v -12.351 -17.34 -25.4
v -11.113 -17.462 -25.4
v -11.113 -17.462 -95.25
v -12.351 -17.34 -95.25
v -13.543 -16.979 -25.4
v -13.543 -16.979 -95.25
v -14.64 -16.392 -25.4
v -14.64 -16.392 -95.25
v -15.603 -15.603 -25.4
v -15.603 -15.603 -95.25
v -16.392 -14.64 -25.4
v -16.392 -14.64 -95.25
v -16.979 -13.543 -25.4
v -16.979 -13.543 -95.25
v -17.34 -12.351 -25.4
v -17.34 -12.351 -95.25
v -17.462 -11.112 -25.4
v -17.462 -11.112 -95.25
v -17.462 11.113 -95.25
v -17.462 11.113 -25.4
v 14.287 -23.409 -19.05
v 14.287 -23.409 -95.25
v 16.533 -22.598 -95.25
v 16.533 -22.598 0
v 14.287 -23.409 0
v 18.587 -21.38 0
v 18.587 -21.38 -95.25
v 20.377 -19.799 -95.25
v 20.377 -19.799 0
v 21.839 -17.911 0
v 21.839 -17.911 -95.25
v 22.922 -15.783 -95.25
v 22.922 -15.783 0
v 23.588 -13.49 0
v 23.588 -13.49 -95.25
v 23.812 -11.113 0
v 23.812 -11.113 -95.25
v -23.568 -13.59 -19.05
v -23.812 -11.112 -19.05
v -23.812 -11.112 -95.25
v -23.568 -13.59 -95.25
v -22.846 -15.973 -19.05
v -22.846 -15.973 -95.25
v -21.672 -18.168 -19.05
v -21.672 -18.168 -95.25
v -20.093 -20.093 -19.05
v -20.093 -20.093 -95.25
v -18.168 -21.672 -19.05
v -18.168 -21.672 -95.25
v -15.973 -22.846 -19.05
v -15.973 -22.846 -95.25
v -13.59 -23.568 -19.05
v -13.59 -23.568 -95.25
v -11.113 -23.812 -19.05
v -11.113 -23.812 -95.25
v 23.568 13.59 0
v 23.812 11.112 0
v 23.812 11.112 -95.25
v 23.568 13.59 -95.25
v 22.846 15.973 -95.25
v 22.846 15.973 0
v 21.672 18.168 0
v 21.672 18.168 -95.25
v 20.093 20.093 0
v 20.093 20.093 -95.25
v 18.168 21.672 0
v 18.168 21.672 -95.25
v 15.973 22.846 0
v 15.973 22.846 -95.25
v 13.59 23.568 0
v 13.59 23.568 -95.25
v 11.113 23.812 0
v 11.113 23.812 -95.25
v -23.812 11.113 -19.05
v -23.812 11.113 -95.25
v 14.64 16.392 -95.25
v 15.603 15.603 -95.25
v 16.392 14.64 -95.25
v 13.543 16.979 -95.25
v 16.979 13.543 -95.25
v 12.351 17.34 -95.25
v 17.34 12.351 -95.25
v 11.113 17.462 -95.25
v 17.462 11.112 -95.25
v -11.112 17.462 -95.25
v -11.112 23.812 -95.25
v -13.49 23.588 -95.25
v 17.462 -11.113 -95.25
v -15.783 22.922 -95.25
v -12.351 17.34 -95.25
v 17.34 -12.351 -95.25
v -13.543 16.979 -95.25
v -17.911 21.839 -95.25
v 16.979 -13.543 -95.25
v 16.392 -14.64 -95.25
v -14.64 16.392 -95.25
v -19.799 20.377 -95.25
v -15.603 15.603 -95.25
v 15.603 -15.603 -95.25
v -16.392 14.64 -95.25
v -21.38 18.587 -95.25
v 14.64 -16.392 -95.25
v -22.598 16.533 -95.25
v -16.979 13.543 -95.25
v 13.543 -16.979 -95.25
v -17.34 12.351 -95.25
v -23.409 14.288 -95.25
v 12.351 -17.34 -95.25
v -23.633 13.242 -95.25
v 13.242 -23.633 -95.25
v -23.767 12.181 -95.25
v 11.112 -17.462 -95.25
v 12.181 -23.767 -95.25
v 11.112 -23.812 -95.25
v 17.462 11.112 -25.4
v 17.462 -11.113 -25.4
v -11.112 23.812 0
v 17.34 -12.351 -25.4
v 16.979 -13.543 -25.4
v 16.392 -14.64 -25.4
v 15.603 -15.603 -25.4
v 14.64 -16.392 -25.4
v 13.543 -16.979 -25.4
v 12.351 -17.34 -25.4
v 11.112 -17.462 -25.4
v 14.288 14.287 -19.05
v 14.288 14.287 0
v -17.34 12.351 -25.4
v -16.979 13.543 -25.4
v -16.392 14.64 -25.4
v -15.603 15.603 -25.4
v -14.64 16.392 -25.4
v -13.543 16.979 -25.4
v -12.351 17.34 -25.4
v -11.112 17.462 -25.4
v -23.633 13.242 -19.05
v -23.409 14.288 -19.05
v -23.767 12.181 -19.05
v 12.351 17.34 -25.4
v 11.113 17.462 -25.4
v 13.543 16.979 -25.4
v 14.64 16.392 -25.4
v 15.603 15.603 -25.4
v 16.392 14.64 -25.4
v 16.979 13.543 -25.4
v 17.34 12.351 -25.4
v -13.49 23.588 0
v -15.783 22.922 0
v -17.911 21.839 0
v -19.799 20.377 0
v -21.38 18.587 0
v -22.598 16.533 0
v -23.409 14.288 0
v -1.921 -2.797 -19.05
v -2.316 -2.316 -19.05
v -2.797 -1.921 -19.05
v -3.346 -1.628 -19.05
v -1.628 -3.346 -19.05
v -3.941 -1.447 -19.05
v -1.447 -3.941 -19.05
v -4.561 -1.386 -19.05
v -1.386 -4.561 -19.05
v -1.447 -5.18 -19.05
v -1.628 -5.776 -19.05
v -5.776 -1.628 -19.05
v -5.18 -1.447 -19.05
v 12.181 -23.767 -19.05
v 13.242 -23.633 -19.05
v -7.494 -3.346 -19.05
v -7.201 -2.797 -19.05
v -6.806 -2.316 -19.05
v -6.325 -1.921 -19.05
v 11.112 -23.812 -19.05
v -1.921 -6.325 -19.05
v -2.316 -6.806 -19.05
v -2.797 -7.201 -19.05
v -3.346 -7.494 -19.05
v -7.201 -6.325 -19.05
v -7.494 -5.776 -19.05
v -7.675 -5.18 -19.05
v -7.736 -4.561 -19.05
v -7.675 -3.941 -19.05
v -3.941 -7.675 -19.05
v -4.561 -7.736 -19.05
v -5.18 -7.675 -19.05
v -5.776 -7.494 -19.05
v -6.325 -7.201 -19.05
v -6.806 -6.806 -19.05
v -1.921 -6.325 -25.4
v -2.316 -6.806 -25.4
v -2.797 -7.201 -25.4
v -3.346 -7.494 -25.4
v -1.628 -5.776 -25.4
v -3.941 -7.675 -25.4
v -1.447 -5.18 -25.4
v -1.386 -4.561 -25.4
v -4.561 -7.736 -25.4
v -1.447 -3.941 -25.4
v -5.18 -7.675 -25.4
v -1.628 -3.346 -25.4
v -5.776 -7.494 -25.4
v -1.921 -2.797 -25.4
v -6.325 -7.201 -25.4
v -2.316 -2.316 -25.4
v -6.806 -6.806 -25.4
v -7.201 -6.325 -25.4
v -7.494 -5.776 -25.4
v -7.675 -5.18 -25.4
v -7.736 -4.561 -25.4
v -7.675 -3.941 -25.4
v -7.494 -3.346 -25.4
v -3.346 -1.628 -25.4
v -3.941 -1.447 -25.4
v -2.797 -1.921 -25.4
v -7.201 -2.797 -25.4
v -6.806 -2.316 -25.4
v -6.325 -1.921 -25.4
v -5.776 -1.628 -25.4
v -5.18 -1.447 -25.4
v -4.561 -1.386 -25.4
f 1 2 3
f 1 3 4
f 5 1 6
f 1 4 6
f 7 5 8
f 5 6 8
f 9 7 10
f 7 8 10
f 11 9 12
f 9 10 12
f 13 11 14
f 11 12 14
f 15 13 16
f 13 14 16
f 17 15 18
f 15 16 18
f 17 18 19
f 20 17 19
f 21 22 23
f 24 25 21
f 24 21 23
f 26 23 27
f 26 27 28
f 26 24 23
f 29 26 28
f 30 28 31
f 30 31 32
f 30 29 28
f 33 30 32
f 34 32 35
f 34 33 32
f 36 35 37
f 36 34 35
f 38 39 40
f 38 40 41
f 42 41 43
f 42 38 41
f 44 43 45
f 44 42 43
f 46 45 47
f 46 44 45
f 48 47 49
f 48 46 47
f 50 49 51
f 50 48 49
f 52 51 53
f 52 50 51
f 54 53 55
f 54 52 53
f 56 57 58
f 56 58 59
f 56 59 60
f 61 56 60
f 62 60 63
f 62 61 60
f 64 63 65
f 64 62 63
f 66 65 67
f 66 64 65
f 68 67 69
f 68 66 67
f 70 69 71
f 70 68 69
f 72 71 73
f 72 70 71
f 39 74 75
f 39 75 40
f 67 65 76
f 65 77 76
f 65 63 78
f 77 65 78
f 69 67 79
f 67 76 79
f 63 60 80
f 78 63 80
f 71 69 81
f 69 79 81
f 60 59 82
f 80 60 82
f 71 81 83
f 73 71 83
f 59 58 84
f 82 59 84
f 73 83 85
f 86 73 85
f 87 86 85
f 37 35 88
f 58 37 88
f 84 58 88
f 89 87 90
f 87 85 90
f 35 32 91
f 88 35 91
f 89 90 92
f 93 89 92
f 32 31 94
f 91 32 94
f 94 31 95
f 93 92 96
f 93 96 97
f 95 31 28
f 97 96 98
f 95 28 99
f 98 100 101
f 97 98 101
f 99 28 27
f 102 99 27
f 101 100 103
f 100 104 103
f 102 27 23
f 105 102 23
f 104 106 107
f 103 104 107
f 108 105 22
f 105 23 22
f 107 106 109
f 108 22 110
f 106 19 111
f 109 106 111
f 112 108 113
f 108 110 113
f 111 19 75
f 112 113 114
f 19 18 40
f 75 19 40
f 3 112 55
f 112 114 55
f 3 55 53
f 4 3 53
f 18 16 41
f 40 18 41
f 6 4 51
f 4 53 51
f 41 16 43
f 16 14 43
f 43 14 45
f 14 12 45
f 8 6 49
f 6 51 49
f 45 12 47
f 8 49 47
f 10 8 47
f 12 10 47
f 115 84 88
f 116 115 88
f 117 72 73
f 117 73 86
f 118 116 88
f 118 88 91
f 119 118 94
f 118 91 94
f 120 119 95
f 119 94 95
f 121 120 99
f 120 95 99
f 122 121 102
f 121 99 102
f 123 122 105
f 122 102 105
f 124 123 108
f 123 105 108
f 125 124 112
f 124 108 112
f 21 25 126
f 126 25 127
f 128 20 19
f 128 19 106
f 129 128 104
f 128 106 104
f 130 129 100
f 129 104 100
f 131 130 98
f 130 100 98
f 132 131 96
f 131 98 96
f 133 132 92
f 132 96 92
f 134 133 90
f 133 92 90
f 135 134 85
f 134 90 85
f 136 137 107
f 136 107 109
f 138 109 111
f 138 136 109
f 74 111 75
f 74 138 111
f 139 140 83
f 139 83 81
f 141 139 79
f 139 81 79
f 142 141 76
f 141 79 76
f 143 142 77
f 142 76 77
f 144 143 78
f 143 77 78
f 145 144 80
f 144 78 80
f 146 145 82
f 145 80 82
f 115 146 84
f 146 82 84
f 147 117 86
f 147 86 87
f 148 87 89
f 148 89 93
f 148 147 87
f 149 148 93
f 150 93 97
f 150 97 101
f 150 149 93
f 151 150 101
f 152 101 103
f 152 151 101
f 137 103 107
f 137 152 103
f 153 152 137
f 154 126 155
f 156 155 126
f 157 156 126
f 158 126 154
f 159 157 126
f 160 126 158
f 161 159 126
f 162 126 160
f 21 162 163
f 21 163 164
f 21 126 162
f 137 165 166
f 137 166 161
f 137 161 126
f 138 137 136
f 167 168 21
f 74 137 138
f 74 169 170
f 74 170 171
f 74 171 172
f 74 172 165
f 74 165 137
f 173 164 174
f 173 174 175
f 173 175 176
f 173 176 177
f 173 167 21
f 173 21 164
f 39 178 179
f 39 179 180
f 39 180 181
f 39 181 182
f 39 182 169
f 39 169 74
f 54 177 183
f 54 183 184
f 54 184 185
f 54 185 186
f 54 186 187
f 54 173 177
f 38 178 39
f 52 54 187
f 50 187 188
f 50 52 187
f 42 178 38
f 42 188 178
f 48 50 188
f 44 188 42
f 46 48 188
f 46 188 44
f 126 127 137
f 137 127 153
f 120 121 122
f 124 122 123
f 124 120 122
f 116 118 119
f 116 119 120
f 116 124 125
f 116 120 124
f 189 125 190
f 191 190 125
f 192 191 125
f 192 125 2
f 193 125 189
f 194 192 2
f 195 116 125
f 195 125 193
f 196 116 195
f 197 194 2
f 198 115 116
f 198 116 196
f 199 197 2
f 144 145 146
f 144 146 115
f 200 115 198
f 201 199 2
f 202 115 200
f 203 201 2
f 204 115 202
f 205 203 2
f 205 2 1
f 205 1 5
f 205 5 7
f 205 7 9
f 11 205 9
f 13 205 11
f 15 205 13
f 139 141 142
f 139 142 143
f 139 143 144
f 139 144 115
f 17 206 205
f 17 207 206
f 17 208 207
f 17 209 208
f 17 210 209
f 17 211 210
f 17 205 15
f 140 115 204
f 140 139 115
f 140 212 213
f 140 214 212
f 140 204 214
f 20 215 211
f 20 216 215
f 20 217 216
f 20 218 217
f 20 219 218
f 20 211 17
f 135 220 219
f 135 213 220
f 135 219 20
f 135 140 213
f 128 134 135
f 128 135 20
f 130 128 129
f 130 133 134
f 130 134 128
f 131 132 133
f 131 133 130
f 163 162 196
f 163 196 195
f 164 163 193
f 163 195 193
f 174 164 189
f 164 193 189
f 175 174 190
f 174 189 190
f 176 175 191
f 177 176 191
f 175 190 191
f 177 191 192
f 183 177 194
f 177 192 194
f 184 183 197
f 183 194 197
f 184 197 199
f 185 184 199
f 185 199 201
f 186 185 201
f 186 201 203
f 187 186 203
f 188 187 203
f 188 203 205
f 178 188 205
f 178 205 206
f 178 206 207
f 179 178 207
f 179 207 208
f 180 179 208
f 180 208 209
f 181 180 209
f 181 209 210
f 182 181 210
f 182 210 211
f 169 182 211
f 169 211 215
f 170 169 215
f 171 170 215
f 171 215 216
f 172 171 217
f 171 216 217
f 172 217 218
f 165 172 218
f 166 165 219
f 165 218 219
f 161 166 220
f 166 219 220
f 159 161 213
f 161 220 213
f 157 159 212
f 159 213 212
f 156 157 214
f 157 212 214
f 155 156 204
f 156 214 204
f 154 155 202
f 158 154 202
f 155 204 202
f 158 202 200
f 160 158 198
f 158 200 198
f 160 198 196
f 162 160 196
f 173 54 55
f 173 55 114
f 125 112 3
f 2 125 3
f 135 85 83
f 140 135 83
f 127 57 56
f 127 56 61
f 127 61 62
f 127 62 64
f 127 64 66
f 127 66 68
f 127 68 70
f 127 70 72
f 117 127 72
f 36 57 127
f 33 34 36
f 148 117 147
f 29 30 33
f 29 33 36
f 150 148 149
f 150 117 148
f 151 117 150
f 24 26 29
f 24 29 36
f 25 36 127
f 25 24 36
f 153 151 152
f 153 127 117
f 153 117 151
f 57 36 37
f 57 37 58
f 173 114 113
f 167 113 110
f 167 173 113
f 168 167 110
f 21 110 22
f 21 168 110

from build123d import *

# Parameters (mm, degrees)
F1_DEPTH       = 95.25
F2_DEPTH       = 19.05
F5_DEPTH       = 69.85
F7_D           = 6.35
F7_DEPTH       = 25.4
F7_CBORE_D     = 6.35
F7_CBORE_DEPTH = 6.35
F9_ANGLE       = 180


with BuildPart() as f1:
    # F0 (on Top) → F1 (new body)
    with BuildSketch(Plane.XY):
        with BuildLine():
            Line((-14.2875, -14.2875), (-14.2875, 23.409222))
            ThreePointArc((-14.2875, 23.409222), (-21.152732, 18.88963), (-23.8125, 11.1125))
            Line((-23.8125, 11.1125), (-23.8125, -11.1125))
            ThreePointArc((-23.8125, -11.1125), (-20.092756, -20.092756), (-11.1125, -23.8125))
            Line((-11.1125, -23.8125), (11.1125, -23.8125))
            ThreePointArc((11.1125, -23.8125), (18.88963, -21.152732), (23.409222, -14.2875))
            Line((23.409222, -14.2875), (-14.2875, -14.2875))
        make_face()
        with BuildLine():
            Line((11.1125, 23.8125), (-11.1125, 23.8125))
            ThreePointArc((-11.1125, 23.8125), (-12.712755, 23.711277), (-14.2875, 23.409222))
            Line((-14.2875, 23.409222), (-14.2875, -14.2875))
            Line((-14.2875, -14.2875), (23.409222, -14.2875))
            ThreePointArc((23.409222, -14.2875), (23.711277, -12.712755), (23.8125, -11.1125))
            Line((23.8125, -11.1125), (23.8125, 11.1125))
            ThreePointArc((23.8125, 11.1125), (20.092756, 20.092756), (11.1125, 23.8125))
        make_face()
    extrude(amount=-F1_DEPTH)

    # F0 (on Top) → F2 (cut)
    with BuildSketch(Plane.XY):
        with BuildLine():
            Line((11.1125, 23.8125), (-11.1125, 23.8125))
            ThreePointArc((-11.1125, 23.8125), (-12.712755, 23.711277), (-14.2875, 23.409222))
            Line((-14.2875, 23.409222), (-14.2875, -14.2875))
            Line((-14.2875, -14.2875), (23.409222, -14.2875))
            ThreePointArc((23.409222, -14.2875), (23.711277, -12.712755), (23.8125, -11.1125))
            Line((23.8125, -11.1125), (23.8125, 11.1125))
            ThreePointArc((23.8125, 11.1125), (20.092756, 20.092756), (11.1125, 23.8125))
        make_face()
    extrude(amount=-F2_DEPTH, mode=Mode.SUBTRACT)

    # F3 (on face) → F5 (cut, through all)
    with BuildSketch(Plane(origin=(0, 0, -95.25), x_dir=(1, 0, 0), z_dir=(0, 0, -1))):
        with BuildLine():
            Line((17.4625, -11.1125), (17.4625, 11.1125))
            ThreePointArc((17.4625, 11.1125), (15.602628, 15.602628), (11.1125, 17.4625))
            Line((11.1125, 17.4625), (-11.1125, 17.4625))
            ThreePointArc((-11.1125, 17.4625), (-15.602628, 15.602628), (-17.4625, 11.1125))
            Line((-17.4625, 11.1125), (-17.4625, -11.1125))
            ThreePointArc((-17.4625, -11.1125), (-15.602628, -15.602628), (-11.1125, -17.4625))
            Line((-11.1125, -17.4625), (11.1125, -17.4625))
            ThreePointArc((11.1125, -17.4625), (15.602628, -15.602628), (17.4625, -11.1125))
        make_face()
    extrude(amount=-F5_DEPTH, mode=Mode.SUBTRACT)

    # F7
    with Locations(Plane.XY.offset(-19.05)):
        with Locations((4.560861, 4.560861)):
            CounterBoreHole(F7_D / 2, F7_CBORE_D / 2, F7_CBORE_DEPTH, depth=F7_DEPTH)


with BuildPart() as f1_1:
    # F9: moved
    add(f1.part.rotate(Axis((0, 0, 6.654953), (0, 0, 1)), F9_ANGLE))


solid = f1_1.part
